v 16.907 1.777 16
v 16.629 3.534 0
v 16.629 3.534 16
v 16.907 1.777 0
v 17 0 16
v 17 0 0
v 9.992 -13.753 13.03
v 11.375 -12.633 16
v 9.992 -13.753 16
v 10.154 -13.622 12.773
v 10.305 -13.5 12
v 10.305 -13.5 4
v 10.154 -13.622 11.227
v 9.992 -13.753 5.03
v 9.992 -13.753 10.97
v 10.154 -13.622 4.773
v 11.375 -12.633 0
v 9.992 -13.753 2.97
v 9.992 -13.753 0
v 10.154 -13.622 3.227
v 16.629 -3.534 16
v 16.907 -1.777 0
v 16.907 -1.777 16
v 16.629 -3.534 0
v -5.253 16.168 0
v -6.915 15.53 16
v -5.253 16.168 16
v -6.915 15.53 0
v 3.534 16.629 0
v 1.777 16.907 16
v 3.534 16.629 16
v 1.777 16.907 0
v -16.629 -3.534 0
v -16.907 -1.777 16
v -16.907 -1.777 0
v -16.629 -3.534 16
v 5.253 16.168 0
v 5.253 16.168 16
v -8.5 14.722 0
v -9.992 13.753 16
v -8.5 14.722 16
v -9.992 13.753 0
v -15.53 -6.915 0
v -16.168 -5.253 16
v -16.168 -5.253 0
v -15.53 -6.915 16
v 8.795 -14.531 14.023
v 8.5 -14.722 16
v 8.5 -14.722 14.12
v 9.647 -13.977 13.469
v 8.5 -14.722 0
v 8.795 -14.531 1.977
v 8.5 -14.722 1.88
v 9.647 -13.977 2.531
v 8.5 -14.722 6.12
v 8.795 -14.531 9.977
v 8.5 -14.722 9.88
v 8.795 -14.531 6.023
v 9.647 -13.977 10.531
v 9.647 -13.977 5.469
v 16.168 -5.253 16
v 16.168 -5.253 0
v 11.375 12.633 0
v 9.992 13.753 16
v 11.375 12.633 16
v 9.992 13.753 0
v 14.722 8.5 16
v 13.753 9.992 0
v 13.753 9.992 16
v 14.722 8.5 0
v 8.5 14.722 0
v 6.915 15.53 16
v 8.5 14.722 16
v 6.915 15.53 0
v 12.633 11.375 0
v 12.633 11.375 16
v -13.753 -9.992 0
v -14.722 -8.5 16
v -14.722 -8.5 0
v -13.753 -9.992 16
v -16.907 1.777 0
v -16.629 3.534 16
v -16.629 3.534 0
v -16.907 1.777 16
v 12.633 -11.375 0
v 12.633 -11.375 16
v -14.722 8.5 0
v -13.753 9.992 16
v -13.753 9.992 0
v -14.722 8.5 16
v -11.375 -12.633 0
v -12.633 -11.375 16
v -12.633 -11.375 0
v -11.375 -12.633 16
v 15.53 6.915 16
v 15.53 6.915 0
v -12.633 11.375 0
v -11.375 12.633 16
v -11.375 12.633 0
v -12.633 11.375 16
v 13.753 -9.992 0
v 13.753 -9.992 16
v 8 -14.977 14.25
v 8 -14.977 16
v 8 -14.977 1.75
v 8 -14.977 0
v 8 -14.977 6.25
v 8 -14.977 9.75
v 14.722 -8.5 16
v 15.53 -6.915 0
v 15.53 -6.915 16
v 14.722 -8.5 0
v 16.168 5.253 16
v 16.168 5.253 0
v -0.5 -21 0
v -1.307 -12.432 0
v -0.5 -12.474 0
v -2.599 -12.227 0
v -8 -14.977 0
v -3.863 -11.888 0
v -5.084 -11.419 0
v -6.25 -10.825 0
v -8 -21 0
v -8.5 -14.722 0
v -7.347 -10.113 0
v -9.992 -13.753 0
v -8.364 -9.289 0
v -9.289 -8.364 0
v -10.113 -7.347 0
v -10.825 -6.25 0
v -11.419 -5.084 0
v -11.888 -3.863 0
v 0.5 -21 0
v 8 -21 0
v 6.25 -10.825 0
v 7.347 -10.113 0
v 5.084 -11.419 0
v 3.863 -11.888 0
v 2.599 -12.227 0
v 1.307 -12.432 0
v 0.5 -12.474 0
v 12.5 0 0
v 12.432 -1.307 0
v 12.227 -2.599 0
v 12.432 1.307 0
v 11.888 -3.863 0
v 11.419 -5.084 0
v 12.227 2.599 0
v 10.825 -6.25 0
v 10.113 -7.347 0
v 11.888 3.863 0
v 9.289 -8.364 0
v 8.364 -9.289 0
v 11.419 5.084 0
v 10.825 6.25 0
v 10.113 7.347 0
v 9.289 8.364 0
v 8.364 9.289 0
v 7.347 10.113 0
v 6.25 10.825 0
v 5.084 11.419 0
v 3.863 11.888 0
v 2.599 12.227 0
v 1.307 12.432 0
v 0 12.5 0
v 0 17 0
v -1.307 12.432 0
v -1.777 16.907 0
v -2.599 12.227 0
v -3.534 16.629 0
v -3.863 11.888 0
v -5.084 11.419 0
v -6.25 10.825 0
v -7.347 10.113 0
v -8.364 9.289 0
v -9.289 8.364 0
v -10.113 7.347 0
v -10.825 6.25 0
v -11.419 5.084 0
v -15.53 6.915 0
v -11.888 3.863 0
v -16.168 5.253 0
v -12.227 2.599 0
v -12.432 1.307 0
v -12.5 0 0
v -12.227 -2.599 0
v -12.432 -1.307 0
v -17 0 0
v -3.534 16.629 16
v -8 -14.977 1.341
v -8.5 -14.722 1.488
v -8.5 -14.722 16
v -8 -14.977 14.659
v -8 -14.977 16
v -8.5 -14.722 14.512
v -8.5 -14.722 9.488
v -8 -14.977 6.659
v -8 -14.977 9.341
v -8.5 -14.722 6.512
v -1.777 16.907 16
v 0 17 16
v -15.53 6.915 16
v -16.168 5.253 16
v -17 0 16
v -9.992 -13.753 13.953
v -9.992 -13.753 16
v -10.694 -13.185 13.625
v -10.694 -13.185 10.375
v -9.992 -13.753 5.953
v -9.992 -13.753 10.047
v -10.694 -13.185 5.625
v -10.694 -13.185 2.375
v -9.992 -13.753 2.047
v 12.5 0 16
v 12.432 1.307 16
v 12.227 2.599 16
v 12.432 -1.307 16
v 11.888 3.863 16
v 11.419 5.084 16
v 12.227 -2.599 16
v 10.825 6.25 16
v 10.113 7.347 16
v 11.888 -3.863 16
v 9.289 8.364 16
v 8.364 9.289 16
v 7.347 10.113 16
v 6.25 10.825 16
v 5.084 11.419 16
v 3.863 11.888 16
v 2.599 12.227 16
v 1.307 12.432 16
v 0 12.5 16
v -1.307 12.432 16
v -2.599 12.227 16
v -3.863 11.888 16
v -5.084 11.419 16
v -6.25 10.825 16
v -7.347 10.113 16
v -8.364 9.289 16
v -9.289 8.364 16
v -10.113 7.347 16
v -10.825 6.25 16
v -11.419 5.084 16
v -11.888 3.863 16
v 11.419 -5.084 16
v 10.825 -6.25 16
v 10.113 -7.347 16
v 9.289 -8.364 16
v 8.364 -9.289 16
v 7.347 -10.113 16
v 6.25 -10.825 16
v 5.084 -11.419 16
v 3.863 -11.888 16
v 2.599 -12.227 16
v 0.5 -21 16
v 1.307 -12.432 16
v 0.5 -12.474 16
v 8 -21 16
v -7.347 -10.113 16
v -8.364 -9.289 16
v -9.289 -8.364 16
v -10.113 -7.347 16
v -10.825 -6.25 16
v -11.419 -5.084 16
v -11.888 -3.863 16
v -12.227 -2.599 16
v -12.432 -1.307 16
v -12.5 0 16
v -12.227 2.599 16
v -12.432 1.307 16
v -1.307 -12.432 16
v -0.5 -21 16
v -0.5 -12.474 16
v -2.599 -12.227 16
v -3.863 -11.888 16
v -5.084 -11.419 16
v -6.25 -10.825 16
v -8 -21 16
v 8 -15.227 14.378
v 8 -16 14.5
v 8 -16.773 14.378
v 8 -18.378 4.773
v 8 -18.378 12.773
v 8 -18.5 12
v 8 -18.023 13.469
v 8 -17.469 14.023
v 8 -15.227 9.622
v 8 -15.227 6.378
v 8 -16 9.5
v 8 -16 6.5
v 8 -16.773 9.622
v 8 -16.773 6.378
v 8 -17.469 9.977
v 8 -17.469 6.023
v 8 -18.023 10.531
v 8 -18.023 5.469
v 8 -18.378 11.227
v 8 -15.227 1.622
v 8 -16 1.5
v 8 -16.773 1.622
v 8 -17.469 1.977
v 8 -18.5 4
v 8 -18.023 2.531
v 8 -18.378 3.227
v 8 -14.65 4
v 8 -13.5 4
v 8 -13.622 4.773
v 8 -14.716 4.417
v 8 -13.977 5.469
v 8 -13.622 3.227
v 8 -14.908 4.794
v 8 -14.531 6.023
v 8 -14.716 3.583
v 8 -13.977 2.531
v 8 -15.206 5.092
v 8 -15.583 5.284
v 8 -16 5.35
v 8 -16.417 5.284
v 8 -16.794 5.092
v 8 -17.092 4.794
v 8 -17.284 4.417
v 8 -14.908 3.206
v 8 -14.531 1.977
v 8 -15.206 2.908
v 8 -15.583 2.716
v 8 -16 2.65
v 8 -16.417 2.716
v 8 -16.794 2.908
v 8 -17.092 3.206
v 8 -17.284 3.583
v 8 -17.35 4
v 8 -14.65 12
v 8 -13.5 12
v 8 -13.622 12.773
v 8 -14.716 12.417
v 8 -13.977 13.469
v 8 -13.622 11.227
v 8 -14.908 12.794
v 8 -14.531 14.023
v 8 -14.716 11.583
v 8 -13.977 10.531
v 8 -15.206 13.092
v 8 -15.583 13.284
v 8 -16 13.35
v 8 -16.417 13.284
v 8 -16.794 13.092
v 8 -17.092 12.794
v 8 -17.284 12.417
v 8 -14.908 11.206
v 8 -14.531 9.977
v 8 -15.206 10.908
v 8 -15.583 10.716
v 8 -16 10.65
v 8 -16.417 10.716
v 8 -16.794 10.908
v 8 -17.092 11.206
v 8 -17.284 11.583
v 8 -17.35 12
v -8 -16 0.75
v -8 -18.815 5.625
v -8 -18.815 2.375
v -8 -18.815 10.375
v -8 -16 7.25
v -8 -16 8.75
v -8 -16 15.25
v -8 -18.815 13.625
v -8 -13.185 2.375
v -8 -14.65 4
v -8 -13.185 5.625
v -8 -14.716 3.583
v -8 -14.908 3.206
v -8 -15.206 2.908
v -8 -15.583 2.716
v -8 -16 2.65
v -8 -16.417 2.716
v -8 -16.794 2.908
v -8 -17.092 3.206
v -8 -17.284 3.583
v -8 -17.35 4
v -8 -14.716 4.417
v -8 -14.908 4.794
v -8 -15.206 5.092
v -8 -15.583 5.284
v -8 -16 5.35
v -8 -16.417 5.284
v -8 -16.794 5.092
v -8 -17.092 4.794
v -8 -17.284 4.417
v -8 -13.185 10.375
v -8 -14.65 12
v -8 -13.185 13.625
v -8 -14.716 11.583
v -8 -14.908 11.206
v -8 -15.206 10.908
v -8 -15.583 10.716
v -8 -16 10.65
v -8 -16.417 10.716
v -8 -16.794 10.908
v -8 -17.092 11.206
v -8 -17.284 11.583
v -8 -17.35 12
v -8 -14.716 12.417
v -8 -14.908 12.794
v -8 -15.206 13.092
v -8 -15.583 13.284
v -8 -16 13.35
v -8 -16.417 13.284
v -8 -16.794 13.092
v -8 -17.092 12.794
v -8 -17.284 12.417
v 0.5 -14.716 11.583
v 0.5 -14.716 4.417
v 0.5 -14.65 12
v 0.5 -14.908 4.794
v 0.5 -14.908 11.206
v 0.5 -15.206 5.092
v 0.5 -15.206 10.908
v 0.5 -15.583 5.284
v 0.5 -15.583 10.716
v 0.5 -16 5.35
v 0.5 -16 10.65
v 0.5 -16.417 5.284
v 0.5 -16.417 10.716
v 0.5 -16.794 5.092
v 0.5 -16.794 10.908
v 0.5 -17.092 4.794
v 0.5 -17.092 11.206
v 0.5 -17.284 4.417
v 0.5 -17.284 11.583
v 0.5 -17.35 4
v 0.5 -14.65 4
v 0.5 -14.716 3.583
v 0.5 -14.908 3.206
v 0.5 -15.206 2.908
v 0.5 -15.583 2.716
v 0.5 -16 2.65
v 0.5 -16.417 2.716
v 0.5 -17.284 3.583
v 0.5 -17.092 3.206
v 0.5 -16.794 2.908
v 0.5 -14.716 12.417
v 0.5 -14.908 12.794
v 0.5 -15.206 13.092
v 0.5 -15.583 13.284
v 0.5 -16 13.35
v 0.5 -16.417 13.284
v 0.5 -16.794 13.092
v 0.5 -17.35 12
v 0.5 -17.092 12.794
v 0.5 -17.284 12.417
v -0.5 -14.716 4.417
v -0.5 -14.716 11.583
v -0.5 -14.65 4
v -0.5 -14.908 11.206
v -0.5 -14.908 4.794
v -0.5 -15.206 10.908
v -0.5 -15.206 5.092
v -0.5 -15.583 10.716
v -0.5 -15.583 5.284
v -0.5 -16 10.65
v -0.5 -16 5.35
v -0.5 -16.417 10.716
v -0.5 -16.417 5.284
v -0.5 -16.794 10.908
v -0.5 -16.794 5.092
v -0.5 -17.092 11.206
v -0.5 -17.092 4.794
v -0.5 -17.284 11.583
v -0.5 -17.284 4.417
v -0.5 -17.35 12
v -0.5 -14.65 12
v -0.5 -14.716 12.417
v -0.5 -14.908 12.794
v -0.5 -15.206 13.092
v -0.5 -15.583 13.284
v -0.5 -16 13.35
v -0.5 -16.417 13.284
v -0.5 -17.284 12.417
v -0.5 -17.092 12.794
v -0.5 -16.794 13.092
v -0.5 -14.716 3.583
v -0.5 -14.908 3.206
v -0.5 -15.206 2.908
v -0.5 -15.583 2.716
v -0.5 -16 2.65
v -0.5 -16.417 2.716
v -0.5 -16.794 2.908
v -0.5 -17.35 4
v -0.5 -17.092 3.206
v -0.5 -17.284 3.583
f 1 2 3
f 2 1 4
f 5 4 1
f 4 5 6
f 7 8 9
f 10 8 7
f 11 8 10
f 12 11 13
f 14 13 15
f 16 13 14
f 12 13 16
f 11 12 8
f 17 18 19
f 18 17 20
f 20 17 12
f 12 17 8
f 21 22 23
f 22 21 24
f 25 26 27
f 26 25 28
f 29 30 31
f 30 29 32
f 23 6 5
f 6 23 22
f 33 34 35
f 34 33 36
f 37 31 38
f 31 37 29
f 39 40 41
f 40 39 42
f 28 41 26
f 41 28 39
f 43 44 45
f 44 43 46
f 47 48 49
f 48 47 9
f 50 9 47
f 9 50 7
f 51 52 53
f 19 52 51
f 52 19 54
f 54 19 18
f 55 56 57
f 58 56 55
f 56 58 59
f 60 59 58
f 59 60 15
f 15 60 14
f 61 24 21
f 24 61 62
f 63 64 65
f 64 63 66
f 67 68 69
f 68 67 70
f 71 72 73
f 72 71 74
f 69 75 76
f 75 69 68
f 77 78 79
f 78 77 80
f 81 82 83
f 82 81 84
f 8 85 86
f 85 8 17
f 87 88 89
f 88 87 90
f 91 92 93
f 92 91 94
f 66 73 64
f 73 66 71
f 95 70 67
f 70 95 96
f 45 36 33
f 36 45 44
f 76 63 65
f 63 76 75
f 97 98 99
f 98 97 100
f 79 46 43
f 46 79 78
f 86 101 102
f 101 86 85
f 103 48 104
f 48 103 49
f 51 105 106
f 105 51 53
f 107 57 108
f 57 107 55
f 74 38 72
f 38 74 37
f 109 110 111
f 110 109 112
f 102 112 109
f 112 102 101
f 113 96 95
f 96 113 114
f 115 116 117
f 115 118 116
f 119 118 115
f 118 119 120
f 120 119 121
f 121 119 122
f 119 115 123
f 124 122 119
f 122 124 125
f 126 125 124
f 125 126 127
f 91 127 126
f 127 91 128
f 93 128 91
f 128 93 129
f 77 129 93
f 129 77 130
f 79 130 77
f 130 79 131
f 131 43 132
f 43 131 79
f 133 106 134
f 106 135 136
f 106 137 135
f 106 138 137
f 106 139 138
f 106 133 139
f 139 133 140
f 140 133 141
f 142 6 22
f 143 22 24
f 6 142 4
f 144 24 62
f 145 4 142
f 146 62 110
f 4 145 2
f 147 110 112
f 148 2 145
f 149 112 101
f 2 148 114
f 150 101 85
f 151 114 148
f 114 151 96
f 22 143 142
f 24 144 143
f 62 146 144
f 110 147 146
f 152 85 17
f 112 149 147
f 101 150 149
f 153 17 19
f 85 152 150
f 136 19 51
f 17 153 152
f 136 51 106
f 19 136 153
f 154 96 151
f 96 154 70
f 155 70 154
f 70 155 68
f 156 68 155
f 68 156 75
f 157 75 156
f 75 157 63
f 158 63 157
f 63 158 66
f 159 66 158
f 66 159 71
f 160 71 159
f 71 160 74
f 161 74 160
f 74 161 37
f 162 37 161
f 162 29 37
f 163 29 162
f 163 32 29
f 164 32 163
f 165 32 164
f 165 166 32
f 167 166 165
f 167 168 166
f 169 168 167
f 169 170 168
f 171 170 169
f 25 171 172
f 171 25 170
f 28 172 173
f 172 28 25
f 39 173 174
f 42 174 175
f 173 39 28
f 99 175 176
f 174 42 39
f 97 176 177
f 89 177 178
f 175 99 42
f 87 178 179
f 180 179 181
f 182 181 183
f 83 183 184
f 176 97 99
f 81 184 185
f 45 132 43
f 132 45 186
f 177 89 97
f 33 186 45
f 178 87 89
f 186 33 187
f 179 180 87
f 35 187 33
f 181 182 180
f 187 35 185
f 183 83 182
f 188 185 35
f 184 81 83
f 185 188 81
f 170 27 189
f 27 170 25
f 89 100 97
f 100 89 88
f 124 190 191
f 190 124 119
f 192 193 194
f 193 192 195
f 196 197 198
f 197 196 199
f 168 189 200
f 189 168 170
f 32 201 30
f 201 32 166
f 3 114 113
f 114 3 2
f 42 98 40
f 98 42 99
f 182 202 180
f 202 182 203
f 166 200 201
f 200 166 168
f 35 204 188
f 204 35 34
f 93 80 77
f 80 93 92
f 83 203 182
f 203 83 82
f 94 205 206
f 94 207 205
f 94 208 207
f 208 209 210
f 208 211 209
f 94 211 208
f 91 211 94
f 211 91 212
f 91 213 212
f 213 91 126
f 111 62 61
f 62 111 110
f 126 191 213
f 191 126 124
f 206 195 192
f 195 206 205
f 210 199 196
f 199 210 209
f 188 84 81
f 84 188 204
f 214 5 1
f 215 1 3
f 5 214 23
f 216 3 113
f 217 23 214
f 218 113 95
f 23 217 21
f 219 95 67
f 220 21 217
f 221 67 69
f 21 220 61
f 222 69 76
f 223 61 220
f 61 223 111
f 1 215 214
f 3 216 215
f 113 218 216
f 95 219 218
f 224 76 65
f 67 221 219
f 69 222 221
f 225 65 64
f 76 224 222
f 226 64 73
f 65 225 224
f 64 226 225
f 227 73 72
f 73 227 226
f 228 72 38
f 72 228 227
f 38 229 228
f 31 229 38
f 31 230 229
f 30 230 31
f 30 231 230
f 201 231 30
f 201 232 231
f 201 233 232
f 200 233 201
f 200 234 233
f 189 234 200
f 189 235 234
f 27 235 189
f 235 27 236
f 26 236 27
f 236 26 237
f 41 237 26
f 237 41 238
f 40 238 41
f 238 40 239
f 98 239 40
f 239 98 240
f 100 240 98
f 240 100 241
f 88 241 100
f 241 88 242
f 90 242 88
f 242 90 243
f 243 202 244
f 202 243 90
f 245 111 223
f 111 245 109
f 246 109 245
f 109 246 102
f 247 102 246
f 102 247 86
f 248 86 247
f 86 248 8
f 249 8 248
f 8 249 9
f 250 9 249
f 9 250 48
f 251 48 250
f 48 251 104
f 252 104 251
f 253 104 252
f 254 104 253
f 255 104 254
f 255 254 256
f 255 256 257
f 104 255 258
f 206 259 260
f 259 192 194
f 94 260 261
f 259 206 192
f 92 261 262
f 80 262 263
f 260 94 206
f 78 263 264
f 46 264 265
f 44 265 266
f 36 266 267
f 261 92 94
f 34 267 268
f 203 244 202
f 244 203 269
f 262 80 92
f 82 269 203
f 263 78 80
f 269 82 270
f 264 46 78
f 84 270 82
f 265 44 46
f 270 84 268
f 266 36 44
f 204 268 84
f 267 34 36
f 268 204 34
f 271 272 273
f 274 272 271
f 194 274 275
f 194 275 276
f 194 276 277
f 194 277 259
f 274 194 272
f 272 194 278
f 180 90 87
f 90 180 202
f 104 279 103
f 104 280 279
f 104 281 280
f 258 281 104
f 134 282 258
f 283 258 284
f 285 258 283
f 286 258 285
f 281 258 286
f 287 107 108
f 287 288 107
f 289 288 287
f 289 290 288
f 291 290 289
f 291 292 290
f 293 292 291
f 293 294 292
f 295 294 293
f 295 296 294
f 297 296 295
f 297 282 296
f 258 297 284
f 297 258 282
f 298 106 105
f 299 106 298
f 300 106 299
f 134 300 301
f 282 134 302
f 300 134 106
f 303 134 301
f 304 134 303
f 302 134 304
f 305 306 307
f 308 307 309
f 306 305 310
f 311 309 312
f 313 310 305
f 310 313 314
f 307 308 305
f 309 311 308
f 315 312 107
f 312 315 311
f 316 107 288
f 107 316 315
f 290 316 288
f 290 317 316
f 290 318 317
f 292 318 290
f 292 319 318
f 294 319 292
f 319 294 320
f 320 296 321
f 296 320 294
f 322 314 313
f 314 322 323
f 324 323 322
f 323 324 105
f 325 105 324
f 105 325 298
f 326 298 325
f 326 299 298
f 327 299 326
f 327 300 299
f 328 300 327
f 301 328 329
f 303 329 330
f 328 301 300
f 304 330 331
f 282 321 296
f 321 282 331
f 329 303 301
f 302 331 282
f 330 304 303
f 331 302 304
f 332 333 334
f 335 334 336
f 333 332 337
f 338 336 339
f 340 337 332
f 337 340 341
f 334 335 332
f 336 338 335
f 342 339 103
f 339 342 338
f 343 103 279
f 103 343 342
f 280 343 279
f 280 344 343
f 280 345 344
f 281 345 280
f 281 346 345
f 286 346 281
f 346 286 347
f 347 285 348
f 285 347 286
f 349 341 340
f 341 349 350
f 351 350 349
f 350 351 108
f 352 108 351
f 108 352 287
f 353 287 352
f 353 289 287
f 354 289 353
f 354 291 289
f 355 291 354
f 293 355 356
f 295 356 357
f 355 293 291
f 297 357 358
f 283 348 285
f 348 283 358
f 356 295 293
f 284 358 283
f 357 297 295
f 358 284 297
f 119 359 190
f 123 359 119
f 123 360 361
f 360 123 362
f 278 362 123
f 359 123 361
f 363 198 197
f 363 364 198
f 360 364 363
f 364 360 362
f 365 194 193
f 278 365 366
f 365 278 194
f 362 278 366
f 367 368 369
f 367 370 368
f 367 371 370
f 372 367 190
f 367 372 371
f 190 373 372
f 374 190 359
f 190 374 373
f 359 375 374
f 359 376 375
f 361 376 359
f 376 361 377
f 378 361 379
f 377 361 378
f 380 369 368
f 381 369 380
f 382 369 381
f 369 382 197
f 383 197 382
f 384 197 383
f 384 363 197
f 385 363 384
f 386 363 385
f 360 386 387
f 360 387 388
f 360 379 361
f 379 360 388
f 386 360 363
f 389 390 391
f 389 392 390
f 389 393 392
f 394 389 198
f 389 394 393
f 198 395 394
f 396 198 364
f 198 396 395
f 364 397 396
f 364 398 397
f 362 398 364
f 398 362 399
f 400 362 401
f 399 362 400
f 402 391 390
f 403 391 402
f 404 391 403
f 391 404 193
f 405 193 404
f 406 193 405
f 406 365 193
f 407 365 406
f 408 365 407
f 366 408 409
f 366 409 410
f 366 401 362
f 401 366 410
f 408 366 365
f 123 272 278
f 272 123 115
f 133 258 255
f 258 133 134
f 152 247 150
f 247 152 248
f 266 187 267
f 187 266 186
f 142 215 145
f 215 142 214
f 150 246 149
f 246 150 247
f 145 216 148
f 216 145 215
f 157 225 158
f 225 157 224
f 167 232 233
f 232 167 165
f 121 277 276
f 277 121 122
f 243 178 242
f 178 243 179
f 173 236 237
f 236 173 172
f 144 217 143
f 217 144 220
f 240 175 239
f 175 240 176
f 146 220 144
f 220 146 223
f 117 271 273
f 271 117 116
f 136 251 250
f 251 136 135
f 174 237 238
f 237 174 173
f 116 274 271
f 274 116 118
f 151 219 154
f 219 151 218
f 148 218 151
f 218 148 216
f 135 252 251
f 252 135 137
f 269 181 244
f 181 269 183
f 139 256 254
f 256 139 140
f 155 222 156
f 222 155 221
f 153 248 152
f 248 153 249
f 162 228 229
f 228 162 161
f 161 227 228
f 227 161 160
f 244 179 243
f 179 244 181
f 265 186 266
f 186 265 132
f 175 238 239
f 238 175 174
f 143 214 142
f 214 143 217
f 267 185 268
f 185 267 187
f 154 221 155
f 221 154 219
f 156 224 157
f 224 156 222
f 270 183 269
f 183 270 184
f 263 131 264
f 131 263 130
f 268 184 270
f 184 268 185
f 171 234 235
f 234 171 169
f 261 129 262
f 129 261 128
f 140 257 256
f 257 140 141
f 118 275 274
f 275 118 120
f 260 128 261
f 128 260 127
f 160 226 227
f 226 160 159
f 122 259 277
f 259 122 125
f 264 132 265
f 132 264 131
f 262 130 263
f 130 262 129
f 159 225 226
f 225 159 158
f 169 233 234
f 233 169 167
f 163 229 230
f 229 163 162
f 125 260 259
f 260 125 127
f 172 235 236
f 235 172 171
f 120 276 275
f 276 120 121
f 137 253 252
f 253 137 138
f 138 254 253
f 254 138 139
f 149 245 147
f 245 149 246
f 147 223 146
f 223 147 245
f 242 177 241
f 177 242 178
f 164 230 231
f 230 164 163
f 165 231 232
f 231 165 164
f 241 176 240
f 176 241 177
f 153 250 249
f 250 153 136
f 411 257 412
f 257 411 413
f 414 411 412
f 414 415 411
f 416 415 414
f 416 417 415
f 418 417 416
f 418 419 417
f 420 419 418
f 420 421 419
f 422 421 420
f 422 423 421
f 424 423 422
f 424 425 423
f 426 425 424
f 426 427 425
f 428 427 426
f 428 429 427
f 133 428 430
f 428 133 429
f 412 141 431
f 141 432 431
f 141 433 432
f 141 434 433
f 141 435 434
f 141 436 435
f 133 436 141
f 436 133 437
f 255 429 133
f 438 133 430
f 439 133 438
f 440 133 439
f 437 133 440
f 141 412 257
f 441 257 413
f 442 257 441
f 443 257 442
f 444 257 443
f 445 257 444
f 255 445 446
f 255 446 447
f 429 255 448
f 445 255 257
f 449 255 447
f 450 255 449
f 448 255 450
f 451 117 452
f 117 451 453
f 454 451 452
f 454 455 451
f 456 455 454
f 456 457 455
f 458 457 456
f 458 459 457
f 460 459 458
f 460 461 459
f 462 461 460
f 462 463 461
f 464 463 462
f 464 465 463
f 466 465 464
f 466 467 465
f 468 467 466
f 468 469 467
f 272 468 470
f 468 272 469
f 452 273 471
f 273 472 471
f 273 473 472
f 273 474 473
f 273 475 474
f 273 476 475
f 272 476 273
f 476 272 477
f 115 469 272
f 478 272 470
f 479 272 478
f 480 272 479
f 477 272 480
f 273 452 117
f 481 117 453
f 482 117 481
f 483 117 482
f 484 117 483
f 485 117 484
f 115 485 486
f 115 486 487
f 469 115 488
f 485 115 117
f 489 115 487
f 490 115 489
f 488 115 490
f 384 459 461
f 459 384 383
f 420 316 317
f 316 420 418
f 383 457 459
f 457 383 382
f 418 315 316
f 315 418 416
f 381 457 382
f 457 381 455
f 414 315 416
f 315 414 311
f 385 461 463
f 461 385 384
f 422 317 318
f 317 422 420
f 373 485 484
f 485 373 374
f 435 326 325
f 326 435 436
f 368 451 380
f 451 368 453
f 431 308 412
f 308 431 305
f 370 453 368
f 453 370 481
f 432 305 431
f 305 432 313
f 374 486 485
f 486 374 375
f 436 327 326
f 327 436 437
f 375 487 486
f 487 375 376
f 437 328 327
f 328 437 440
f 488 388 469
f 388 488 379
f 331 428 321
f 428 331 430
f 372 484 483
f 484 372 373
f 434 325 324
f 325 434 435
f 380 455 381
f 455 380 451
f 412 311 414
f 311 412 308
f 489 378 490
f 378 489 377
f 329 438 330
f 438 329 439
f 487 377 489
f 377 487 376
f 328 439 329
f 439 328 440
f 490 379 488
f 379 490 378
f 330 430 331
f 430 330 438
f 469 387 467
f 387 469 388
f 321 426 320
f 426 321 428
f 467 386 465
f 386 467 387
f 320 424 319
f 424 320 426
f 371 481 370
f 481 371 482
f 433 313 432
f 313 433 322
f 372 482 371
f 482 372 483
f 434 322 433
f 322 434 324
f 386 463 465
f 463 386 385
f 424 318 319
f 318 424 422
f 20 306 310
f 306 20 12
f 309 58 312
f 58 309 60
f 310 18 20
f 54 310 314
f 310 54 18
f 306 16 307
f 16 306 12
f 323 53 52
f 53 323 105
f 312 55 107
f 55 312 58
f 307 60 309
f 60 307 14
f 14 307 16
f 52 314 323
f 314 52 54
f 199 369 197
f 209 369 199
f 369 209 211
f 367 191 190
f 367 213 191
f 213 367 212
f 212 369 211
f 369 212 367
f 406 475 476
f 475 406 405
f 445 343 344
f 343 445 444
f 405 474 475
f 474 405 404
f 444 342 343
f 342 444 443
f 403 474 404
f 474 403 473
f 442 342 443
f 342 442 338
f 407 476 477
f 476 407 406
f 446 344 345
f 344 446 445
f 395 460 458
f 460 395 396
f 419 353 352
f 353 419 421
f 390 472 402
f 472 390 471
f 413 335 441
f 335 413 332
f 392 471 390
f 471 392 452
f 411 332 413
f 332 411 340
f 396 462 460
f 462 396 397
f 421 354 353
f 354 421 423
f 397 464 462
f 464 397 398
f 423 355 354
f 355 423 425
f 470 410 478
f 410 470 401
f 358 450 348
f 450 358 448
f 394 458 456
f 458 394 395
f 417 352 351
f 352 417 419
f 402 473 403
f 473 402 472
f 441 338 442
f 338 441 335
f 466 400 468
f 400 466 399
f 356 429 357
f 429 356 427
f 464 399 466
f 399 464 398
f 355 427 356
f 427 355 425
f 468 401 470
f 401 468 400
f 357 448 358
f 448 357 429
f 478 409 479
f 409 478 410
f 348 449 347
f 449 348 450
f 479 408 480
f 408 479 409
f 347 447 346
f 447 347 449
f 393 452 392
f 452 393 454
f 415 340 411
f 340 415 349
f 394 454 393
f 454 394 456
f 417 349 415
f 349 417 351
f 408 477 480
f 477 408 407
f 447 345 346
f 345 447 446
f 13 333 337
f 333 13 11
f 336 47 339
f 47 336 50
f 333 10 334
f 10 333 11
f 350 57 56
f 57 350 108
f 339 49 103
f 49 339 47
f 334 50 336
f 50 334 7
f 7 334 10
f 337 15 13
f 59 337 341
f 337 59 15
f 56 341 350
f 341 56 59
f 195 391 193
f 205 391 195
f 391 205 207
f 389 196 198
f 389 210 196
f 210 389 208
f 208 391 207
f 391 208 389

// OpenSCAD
$fn=20;

difference(){
union(){
cylinder(d=34,h=16,$fn=60);
translate([-8,-21,0])cube(size=[16,8,16]);
}
translate([0,0,-1]) cylinder(d=25,h=22,$fn=60);
translate([-.5,-25,-1])cube(size=[1,20,22]);

translate ([-15,-16,4])rotate([0,90,0])
cylinder(d=2.7,h=100);
translate ([8,-16,4])rotate([0,90,0])
cylinder(d=5,h=100);
translate ([-18,-16,4])rotate([0,90,0])
cylinder(d=6.5,h=10,$fn=6);

translate ([-15,-16,12])rotate([0,90,0])
cylinder(d=2.7,h=100);
translate ([8,-16,12])rotate([0,90,0])
cylinder(d=5,h=100);
translate ([-18,-16,12])rotate([0,90,0])
cylinder(d=6.5,h=10,$fn=6);
}
